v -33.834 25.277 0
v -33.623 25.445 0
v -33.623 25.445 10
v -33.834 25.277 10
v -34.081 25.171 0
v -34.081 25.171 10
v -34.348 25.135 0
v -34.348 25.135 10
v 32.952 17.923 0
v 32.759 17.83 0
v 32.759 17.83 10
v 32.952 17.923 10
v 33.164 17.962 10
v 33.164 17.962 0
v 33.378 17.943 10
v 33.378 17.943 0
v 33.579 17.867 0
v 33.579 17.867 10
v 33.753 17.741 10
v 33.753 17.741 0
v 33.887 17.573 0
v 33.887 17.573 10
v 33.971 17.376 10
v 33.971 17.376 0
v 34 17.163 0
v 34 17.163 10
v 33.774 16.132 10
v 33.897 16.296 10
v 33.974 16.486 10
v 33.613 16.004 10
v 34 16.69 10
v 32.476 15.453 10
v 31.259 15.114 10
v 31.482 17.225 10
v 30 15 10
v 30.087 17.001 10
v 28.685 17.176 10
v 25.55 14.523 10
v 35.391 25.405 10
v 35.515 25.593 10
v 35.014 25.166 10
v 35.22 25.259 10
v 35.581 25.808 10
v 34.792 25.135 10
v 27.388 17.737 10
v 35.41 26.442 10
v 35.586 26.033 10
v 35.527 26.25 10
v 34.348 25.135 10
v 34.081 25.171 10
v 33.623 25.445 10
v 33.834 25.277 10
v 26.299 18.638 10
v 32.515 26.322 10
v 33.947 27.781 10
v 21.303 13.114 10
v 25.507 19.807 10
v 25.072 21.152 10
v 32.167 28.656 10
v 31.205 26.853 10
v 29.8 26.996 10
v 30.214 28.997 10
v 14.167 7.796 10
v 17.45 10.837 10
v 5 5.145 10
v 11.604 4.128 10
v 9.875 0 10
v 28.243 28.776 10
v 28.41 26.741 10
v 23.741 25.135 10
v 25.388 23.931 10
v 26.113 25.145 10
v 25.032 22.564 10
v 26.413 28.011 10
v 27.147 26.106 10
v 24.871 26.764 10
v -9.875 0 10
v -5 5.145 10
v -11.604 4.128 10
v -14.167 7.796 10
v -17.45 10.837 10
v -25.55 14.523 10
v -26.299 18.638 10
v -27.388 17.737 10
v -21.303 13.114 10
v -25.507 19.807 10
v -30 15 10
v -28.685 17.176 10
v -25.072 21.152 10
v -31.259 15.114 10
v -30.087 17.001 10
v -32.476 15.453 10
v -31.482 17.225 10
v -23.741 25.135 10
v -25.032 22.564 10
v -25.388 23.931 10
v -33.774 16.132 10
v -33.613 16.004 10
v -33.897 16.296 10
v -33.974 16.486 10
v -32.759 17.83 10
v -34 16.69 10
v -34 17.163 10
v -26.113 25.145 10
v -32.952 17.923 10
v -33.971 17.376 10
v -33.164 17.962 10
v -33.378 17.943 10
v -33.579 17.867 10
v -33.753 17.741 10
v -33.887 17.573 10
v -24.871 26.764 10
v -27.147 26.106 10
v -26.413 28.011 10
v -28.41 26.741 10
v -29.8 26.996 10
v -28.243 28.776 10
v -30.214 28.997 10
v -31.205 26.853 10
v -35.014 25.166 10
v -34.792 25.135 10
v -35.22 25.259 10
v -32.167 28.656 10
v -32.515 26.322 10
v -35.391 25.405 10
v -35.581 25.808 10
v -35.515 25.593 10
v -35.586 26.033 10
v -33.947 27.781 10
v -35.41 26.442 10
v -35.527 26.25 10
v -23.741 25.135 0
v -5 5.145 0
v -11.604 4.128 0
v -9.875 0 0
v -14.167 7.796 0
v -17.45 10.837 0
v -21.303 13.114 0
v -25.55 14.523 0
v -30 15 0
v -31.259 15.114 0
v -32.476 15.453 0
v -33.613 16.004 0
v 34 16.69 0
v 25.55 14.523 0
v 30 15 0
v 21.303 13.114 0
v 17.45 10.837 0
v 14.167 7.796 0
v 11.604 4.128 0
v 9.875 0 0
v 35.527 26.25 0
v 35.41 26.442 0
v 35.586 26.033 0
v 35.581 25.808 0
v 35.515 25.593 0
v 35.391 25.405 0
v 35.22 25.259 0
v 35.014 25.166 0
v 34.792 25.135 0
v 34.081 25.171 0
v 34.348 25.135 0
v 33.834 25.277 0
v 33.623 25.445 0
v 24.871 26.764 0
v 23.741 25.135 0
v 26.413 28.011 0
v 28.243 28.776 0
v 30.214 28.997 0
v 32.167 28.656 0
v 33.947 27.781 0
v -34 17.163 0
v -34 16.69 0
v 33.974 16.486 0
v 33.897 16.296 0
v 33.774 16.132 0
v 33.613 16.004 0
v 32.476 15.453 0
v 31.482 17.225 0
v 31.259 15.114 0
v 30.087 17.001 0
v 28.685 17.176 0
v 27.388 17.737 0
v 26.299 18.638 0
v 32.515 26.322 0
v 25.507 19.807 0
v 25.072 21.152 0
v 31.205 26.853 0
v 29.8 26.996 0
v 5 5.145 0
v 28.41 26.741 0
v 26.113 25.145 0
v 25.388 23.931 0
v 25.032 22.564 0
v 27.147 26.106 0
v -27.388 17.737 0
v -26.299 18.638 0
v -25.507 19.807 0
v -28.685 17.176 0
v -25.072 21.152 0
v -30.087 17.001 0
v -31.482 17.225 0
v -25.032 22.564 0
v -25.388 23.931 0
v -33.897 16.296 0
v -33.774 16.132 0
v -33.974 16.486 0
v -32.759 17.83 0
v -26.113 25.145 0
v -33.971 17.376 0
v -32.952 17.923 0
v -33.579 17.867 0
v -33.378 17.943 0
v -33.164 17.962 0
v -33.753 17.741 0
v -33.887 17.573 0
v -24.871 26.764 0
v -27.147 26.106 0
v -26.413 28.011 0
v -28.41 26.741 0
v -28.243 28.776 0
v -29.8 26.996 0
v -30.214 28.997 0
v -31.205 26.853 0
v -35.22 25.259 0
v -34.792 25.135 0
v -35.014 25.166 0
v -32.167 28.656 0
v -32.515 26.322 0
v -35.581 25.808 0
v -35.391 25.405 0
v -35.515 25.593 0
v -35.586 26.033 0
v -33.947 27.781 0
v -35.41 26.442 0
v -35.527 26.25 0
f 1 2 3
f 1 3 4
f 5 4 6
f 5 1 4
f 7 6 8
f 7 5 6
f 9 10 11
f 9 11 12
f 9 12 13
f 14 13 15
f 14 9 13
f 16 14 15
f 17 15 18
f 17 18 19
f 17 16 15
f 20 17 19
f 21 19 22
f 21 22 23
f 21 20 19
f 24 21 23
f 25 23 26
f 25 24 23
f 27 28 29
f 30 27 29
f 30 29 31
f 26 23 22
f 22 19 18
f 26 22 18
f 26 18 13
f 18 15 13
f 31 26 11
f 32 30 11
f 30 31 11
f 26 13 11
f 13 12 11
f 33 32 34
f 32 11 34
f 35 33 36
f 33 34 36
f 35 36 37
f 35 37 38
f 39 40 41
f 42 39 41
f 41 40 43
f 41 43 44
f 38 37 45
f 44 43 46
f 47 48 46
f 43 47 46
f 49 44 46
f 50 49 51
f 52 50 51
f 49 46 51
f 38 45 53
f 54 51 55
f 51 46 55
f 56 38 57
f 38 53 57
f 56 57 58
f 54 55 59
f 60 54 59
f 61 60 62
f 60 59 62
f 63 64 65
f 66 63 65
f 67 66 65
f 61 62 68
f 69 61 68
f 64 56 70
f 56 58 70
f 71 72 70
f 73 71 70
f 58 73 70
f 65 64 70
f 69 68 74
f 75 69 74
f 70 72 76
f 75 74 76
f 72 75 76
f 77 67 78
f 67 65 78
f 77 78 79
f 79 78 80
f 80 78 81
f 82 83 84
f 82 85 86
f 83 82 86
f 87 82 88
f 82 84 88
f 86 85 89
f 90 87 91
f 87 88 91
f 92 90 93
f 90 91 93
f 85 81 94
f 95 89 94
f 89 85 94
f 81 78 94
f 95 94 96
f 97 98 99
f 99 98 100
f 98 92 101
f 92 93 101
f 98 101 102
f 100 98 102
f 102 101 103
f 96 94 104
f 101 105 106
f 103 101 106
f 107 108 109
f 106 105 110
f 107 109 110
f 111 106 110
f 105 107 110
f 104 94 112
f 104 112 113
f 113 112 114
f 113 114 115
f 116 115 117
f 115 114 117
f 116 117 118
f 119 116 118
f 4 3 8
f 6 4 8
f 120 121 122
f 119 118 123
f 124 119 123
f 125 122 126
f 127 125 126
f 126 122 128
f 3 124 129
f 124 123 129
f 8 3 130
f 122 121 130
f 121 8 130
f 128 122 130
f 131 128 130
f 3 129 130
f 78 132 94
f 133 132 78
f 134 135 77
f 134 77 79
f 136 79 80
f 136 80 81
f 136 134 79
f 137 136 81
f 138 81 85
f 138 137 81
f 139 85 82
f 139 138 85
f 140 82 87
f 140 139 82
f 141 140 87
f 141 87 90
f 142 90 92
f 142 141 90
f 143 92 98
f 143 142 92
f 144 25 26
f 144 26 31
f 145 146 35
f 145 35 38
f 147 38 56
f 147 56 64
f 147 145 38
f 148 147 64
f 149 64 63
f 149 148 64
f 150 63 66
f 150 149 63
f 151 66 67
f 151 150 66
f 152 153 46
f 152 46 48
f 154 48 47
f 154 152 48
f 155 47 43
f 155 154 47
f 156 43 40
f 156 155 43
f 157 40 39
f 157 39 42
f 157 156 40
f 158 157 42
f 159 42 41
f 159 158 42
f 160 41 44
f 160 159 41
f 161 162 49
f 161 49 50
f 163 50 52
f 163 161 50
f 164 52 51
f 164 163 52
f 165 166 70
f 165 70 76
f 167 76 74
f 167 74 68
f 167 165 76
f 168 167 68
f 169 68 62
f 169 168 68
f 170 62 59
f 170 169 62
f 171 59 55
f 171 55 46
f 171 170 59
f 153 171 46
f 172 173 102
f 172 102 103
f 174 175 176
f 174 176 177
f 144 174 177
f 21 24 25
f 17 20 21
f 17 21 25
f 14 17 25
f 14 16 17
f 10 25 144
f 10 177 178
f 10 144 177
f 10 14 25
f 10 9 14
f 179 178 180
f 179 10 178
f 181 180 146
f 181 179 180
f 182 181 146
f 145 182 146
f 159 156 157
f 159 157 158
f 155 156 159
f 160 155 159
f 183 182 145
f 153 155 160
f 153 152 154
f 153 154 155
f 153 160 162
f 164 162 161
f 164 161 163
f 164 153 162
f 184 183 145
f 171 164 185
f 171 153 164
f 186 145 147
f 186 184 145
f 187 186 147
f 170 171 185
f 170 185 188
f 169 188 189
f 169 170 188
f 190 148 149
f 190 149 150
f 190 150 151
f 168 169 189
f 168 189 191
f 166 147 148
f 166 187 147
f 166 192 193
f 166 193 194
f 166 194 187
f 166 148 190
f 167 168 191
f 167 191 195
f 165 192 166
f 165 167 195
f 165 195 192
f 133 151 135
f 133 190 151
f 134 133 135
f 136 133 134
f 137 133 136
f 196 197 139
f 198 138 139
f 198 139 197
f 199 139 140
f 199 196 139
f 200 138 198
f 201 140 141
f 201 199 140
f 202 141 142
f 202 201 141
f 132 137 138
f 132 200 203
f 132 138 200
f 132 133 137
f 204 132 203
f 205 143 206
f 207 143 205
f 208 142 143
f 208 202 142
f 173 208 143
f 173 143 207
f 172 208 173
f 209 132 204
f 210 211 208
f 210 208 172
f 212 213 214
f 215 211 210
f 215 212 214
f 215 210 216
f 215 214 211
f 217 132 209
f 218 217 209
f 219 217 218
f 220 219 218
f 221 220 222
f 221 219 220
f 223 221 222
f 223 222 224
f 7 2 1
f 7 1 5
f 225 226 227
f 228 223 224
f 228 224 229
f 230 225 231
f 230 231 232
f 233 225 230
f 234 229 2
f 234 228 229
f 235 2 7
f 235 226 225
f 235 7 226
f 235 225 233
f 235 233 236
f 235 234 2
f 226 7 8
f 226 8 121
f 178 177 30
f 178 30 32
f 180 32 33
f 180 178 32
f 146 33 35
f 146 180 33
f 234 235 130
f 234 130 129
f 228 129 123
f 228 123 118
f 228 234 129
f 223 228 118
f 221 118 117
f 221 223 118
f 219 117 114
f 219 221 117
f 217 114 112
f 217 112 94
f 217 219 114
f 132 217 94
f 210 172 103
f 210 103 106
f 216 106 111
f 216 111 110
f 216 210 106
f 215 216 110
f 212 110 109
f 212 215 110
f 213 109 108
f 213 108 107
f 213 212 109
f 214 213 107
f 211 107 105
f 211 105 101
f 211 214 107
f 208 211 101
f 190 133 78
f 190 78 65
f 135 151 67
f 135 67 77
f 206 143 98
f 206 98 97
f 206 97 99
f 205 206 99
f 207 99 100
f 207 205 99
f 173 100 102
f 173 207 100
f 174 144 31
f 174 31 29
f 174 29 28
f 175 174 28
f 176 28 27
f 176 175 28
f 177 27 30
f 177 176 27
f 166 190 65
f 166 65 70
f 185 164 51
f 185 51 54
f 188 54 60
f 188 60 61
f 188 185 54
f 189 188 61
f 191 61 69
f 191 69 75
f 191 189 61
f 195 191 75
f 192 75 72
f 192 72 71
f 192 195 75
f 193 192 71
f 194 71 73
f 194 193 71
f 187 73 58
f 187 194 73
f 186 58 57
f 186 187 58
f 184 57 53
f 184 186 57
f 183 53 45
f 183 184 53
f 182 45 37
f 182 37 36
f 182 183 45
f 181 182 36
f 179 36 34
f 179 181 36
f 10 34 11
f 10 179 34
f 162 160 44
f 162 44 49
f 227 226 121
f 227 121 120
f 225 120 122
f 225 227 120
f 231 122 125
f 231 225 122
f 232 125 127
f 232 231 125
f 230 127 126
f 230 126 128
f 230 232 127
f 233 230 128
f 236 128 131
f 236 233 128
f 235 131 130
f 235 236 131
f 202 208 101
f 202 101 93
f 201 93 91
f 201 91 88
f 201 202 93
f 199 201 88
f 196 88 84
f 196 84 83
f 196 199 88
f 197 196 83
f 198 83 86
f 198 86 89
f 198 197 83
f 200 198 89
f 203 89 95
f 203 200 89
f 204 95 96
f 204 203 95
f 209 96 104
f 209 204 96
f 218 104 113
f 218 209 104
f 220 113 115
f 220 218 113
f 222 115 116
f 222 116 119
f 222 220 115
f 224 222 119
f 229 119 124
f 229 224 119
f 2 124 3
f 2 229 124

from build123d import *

# Parameters (mm, degrees)
BOSS_EXTRUDE1_DEPTH = 10


with BuildPart() as part:
    # Sketch1 → Boss-Extrude1 (new body)
    with BuildSketch(Plane.XY):
        with BuildLine():
            Line((9.875388203, 0), (-9.875388203, 0))
            ThreePointArc((-9.875388203, 0), (-17.450099602, 10.83745824), (-30, 15))
            ThreePointArc((-30, 15), (-31.8749625, 15.255779094), (-33.612903226, 16.004424108))
            ThreePointArc((-33.612903226, 16.004424108), (-33.896535204, 16.29613728), (-34, 16.689632781))
            Line((-34, 16.689632781), (-34, 17.162645351))
            ThreePointArc((-34, 17.162645351), (-33.578745661, 17.867309614), (-32.75862069, 17.829866682))
            ThreePointArc((-32.75862069, 17.829866682), (-25.031925557, 22.564124391), (-33.623370468, 25.445458816))
            ThreePointArc((-33.623370468, 25.445458816), (-33.953767859, 25.215558804), (-34.348044562, 25.134550579))
            Line((-34.348044562, 25.134550579), (-34.791587602, 25.134550579))
            ThreePointArc((-34.791587602, 25.134550579), (-35.51482586, 25.592605522), (-35.409856969, 26.442234524))
            ThreePointArc((-35.409856969, 26.442234524), (-29.220414383, 28.95645357), (-23.74103901, 25.134550579))
            Line((-23.74103901, 25.134550579), (-5, 5.145359938))
            Line((-5, 5.145359938), (5, 5.145359938))
            Line((5, 5.145359938), (23.74103901, 25.134550579))
            ThreePointArc((23.74103901, 25.134550579), (29.220414383, 28.95645357), (35.409856969, 26.442234524))
            ThreePointArc((35.409856969, 26.442234524), (35.51482586, 25.592605522), (34.791587602, 25.134550579))
            Line((34.791587602, 25.134550579), (34.348044562, 25.134550579))
            ThreePointArc((34.348044562, 25.134550579), (33.953767859, 25.215558804), (33.623370468, 25.445458816))
            ThreePointArc((33.623370468, 25.445458816), (25.031925557, 22.564124391), (32.75862069, 17.829866682))
            ThreePointArc((32.75862069, 17.829866682), (33.578745661, 17.867309614), (34, 17.162645351))
            Line((34, 17.162645351), (34, 16.689632781))
            ThreePointArc((34, 16.689632781), (33.896535204, 16.29613728), (33.612903226, 16.004424108))
            ThreePointArc((33.612903226, 16.004424108), (31.8749625, 15.255779094), (30, 15))
            ThreePointArc((30, 15), (17.450099602, 10.83745824), (9.875388203, 0))
        make_face()
    extrude(amount=BOSS_EXTRUDE1_DEPTH)


solid = part.part
